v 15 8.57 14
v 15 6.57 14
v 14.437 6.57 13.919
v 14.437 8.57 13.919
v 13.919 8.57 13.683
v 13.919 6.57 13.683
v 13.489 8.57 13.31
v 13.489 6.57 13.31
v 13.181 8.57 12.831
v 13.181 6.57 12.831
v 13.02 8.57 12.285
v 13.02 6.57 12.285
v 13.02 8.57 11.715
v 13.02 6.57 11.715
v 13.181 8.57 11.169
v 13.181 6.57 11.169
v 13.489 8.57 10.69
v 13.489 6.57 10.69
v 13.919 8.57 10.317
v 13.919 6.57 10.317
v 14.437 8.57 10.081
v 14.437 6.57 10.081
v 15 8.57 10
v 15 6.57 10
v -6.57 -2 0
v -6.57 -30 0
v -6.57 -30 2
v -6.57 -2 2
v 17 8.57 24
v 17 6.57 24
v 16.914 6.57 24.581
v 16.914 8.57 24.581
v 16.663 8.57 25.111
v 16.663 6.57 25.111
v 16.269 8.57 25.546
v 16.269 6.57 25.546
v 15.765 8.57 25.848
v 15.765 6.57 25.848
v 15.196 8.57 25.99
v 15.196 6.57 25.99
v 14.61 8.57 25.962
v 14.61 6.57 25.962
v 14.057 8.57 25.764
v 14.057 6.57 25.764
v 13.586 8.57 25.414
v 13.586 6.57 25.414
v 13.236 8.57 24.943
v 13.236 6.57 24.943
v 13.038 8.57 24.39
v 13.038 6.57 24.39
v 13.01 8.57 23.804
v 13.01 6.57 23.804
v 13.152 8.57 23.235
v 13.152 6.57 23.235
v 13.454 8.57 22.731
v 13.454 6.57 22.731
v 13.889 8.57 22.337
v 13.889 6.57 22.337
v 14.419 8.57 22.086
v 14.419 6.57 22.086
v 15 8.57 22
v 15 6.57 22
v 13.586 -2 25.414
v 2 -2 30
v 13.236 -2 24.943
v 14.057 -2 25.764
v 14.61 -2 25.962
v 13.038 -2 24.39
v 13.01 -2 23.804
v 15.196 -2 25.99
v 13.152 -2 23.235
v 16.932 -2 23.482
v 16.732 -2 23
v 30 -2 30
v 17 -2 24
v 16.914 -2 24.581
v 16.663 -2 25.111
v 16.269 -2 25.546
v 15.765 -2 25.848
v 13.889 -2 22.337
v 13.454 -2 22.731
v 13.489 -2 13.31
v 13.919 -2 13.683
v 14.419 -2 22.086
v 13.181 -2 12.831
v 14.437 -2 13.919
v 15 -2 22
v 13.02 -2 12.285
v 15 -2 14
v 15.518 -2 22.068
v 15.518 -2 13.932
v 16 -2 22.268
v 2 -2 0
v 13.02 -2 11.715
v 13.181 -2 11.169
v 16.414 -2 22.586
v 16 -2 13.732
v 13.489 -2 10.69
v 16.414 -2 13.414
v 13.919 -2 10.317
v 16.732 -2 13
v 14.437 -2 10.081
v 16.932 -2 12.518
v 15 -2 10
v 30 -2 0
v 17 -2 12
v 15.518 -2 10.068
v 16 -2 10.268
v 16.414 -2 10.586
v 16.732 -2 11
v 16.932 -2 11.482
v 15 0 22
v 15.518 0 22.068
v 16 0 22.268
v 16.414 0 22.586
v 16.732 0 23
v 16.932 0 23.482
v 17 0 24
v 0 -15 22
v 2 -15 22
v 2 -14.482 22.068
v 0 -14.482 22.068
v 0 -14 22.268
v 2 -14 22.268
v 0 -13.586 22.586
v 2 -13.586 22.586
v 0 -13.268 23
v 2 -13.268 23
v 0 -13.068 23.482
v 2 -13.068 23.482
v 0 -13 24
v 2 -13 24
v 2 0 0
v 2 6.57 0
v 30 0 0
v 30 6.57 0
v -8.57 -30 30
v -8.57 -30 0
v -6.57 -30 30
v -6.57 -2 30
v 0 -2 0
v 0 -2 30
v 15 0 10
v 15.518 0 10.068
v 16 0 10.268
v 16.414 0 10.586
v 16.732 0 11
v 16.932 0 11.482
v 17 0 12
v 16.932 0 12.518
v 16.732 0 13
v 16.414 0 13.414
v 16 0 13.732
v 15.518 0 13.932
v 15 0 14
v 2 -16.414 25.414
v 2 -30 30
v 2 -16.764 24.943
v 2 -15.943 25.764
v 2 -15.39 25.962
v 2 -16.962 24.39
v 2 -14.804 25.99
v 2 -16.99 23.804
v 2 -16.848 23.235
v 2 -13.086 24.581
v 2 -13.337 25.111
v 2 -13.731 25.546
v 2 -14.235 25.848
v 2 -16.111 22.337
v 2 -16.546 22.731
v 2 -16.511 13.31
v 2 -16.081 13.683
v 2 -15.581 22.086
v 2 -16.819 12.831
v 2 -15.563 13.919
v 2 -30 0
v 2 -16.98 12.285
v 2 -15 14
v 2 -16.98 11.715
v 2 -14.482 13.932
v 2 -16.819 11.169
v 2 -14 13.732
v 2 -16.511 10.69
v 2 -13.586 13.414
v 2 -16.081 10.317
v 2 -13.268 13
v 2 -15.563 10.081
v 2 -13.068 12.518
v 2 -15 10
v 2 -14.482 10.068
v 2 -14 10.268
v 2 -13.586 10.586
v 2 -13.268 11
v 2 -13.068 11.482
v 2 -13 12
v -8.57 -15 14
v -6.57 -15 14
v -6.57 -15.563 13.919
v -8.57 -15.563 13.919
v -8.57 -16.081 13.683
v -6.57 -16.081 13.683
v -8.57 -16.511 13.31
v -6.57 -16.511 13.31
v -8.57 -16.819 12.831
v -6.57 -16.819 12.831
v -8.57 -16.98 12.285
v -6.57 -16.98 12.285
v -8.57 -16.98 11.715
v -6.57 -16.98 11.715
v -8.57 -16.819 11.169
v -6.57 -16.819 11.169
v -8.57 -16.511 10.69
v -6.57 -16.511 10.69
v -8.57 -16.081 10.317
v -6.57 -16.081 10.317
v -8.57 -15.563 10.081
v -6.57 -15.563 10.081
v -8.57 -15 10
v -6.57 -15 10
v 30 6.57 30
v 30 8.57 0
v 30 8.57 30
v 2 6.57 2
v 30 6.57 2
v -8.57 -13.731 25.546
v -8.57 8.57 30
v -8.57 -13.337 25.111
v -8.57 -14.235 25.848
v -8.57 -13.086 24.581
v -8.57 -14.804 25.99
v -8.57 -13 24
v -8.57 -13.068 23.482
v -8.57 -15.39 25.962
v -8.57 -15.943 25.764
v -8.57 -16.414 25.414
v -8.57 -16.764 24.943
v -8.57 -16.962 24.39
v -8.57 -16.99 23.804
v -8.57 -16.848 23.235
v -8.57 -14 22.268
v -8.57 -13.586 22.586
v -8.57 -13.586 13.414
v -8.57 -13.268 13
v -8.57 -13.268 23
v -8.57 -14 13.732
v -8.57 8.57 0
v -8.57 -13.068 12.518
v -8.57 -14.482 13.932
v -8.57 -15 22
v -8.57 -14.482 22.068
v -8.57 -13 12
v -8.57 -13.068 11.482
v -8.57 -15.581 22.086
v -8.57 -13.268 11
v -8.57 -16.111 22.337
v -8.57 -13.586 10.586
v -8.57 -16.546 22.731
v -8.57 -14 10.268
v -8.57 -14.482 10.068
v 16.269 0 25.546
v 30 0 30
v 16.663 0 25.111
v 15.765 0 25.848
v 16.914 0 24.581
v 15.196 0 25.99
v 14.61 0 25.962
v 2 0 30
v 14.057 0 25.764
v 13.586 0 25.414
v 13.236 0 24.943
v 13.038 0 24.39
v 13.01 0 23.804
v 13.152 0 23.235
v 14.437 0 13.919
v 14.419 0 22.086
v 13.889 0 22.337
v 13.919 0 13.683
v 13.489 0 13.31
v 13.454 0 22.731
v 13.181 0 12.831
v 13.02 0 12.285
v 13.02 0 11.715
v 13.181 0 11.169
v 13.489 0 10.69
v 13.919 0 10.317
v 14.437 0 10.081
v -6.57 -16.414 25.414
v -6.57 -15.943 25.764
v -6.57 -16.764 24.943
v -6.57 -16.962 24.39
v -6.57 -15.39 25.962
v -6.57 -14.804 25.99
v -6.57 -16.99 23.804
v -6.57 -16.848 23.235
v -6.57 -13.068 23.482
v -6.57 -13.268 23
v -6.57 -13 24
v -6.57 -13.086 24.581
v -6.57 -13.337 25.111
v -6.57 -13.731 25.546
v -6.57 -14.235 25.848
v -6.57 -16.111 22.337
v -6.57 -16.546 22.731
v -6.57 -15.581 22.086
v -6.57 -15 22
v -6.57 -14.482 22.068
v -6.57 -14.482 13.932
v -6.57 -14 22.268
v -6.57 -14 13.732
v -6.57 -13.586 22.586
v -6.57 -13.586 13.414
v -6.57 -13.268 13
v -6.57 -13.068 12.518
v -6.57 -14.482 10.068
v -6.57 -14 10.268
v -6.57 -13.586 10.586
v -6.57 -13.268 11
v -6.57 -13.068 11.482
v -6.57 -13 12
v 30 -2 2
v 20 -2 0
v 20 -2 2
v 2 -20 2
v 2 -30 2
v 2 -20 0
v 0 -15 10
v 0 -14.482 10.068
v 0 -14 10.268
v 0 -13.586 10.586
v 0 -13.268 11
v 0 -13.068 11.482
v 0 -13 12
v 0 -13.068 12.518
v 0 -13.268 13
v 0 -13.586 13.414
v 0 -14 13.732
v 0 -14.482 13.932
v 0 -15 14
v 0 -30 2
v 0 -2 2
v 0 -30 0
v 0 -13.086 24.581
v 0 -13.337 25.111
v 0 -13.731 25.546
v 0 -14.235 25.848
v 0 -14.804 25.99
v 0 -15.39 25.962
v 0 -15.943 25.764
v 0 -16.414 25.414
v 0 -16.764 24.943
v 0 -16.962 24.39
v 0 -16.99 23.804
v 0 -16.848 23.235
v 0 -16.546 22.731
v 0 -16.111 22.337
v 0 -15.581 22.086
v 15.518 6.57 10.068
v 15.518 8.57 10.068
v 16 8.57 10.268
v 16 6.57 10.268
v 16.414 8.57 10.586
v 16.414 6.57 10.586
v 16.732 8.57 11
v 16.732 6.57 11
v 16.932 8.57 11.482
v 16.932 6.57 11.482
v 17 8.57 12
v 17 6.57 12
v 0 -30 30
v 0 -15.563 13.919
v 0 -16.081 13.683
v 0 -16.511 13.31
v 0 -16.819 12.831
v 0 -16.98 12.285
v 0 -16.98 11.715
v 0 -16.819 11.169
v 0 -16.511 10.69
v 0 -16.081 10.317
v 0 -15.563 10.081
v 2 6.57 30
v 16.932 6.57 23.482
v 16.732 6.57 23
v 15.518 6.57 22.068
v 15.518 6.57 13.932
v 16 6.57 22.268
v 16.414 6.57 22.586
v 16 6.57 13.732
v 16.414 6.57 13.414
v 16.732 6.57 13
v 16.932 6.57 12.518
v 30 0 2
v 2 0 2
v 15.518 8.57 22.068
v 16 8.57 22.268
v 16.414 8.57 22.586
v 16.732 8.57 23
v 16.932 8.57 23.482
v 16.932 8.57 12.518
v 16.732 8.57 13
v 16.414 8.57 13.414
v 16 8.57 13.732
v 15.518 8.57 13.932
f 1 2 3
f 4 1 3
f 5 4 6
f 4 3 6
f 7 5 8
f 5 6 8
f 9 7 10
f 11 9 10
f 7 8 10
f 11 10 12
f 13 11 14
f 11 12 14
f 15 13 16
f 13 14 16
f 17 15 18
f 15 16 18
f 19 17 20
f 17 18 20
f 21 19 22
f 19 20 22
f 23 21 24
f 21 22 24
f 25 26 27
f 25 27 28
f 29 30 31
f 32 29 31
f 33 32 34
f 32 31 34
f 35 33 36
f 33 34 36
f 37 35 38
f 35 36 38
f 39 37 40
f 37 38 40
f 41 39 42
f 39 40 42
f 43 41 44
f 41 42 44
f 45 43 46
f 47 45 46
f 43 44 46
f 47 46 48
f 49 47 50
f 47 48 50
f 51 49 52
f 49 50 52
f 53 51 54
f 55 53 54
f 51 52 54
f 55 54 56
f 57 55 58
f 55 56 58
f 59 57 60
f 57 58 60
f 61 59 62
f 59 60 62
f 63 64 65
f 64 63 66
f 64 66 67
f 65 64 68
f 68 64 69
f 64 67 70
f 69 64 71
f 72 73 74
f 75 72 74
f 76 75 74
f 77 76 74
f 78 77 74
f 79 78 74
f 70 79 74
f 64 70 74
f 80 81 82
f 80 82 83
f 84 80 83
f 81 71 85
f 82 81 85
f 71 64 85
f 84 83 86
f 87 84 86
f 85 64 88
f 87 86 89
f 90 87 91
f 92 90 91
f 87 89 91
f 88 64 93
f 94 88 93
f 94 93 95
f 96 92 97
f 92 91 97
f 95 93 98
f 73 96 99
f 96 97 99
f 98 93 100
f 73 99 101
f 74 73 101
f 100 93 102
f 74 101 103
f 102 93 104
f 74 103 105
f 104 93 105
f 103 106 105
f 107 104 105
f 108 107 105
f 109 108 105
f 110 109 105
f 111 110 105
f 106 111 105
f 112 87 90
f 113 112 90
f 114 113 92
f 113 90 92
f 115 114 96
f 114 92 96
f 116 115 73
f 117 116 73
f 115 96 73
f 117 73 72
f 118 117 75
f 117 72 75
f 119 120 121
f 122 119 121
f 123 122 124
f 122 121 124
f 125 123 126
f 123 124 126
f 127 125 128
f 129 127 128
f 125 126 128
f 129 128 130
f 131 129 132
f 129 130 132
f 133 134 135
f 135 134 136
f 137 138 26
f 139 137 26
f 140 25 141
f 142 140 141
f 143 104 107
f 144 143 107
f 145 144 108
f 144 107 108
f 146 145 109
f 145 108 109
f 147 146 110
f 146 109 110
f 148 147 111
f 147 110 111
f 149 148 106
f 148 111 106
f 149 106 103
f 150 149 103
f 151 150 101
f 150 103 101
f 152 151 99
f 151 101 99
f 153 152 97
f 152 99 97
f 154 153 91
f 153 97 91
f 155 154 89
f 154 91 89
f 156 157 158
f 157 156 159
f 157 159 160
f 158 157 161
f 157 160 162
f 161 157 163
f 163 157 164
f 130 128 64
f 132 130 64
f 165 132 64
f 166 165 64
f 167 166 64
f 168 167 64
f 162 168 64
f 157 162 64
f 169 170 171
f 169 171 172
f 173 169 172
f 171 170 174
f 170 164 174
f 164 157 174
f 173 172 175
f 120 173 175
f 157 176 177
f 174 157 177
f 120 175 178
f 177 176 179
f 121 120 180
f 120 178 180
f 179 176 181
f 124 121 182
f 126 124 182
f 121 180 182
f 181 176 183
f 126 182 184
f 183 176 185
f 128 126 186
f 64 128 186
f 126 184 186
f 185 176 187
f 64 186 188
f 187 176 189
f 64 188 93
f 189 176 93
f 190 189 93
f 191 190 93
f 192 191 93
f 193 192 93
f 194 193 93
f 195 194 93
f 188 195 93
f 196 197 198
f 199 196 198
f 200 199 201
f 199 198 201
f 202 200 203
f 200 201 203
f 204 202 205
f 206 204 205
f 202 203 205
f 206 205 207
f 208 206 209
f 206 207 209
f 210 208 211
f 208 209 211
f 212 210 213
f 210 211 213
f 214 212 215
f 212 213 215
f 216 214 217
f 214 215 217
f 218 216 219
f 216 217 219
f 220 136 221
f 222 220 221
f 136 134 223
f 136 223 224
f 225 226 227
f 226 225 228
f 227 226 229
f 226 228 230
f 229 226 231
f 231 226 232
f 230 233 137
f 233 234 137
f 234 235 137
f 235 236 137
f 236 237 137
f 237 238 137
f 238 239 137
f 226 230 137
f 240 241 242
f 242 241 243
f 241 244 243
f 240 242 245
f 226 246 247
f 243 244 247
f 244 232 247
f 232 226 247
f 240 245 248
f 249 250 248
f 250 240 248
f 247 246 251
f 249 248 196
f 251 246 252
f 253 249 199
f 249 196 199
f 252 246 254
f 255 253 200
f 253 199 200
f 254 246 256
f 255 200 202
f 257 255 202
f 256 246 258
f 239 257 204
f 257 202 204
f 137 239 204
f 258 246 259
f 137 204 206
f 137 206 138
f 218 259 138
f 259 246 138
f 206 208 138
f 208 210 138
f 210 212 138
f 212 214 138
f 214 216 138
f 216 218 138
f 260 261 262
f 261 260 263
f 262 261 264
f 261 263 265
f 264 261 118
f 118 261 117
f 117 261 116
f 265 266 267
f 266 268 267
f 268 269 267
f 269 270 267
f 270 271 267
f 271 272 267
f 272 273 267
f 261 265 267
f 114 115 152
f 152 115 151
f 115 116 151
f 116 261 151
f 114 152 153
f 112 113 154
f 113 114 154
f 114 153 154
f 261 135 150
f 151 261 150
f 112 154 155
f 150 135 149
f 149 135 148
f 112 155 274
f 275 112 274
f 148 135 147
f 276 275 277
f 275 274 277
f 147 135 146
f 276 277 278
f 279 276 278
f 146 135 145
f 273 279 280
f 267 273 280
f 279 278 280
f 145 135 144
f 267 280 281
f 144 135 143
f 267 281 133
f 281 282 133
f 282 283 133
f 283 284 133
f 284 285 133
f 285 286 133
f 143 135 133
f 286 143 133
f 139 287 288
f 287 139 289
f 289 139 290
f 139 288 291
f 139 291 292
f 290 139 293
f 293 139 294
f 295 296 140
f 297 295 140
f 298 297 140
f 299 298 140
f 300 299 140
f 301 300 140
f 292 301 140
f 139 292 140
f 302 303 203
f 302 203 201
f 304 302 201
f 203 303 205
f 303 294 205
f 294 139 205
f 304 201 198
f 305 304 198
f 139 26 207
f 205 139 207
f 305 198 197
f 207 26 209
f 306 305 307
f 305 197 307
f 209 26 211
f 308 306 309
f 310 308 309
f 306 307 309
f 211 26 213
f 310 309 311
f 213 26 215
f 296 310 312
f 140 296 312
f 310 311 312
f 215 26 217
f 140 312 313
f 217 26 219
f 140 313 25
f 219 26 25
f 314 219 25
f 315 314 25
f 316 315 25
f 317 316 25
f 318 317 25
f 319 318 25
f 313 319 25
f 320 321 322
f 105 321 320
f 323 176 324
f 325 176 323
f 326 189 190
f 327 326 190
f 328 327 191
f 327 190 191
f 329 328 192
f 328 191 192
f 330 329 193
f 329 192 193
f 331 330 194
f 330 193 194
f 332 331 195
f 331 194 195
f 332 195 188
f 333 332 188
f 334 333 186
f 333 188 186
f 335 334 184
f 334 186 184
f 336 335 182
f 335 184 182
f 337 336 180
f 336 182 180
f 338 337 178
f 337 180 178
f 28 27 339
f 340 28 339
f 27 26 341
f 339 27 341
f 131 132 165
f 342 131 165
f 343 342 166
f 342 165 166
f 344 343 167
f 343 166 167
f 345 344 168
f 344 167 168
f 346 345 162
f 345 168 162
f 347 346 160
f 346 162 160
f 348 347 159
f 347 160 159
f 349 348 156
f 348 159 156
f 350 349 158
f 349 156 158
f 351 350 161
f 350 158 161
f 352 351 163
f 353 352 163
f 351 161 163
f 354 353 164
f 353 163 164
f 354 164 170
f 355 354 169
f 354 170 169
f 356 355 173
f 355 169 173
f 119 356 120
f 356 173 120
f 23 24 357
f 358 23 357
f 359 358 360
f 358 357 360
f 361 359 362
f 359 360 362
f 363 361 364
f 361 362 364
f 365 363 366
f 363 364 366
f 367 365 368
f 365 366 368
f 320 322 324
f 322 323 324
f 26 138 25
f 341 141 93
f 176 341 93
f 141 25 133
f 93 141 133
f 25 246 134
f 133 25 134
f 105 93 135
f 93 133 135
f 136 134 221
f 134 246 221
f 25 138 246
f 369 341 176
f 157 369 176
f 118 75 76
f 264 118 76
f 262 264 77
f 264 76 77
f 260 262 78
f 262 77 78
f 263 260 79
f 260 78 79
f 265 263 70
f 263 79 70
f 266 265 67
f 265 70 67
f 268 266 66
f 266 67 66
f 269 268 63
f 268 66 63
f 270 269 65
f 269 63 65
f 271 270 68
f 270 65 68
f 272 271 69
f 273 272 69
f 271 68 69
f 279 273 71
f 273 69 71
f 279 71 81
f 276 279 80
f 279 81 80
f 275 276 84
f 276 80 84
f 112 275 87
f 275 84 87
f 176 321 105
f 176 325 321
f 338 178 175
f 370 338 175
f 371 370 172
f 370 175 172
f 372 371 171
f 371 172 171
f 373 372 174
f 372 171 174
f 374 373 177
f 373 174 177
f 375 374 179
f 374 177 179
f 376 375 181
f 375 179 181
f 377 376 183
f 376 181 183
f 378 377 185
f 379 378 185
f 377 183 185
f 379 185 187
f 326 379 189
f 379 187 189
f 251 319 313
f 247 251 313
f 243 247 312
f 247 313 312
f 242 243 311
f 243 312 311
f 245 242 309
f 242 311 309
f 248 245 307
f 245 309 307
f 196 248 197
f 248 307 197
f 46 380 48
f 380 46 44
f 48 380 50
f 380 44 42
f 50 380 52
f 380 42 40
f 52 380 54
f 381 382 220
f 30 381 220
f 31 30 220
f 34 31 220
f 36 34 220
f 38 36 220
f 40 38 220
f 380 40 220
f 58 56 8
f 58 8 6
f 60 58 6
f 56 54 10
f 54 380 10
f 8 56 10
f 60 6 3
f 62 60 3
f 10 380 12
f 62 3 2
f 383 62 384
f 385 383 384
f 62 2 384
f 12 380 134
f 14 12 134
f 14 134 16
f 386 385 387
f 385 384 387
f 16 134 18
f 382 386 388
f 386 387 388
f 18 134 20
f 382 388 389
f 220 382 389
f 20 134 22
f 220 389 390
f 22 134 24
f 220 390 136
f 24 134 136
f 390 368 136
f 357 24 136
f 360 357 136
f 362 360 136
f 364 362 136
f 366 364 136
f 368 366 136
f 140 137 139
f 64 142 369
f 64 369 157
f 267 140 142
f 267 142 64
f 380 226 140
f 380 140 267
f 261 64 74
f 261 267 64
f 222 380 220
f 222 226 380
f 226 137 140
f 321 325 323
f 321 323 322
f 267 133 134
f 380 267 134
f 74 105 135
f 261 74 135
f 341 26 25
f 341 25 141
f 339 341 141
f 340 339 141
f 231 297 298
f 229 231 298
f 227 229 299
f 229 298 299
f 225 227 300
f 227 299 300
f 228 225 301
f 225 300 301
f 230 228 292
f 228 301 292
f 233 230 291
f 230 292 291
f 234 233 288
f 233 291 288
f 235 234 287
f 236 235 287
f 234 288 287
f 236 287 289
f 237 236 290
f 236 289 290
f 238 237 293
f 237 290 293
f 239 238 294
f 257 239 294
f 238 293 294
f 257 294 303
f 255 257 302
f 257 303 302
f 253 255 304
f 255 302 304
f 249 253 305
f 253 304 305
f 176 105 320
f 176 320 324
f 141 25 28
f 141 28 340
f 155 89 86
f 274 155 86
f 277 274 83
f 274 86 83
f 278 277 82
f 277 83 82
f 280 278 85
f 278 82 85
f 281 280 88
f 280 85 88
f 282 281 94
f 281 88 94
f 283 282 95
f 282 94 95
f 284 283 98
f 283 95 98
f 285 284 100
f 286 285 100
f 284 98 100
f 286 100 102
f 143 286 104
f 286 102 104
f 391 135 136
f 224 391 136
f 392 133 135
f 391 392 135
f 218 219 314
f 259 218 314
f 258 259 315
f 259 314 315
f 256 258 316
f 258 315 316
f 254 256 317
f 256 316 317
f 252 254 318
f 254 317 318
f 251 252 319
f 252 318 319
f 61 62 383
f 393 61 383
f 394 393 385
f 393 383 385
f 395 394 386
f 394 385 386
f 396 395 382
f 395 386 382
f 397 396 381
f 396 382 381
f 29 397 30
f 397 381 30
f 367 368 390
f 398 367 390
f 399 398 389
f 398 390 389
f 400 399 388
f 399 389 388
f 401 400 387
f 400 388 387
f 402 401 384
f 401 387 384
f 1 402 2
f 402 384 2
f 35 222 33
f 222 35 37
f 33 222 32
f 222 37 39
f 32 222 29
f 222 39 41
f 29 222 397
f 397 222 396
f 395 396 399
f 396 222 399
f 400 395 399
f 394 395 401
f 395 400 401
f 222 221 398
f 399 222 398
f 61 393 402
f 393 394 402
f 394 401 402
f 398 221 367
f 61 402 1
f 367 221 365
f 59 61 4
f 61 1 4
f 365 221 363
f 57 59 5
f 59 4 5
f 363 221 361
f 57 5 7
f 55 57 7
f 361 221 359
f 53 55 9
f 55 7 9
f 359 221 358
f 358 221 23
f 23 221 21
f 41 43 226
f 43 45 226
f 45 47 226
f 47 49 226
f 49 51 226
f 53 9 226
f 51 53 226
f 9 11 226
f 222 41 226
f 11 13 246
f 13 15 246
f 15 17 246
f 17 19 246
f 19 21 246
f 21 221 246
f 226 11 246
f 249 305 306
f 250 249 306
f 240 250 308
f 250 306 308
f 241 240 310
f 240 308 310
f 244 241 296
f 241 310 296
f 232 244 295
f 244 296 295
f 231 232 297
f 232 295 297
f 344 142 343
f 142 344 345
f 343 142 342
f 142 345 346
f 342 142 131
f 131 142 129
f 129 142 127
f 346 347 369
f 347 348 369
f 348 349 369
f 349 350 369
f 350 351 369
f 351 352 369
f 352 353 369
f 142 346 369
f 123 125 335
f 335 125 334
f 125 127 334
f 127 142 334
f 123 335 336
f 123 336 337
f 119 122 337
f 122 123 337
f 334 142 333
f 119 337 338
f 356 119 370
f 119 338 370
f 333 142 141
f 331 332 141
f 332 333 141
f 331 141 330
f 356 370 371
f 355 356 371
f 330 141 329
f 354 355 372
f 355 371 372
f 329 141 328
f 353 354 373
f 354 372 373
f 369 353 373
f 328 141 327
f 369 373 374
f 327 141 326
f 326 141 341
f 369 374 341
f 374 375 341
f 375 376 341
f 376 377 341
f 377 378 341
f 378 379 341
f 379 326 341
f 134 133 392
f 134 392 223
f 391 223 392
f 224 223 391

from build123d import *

# Parameters (mm, degrees)
F0_W     = 2
F0_H     = 2
F0_W_2   = 28
F0_H_2   = 28
F1_DEPTH = 30
F0_H_3   = 6.57
F2_DEPTH = 2
F0_W_3   = 6.57
F4_DEPTH = 2
F6_DEPTH = 20
F8_DEPTH = 25


# Not quite as in the source:
# - a feature names something its author has since deleted; it is built from what else it names


with BuildPart() as f1:
    # F0 (on Top) → F1 (new body)
    with BuildSketch(Plane.XY):
        Polygon((-6.57, -2), (-6.57, 6.57), (-8.57, 6.57), (-8.57, -30), (-6.57, -30), align=None)
        with Locations((-7.57, 7.57)):
            Rectangle(F0_W, F0_H)
        Polygon((2, 6.57), (30, 6.57), (30, 8.57), (-6.57, 8.57), (-6.57, 6.57), align=None)
        with Locations((16, -1)):
            Rectangle(F0_W_2, F0_H)
        with Locations((1, -16)):
            Rectangle(F0_W, F0_H_2)
        with Locations((1, -1)):
            Rectangle(F0_W, F0_H)
        Polygon((0, 0), (2, 0), (2, 6.57), (-6.57, 6.57), (-6.57, -2), (0, -2), align=None)
    extrude(amount=F1_DEPTH)


with BuildPart() as f2:
    # F0 (on Top) → F2 (new body)
    with BuildSketch(Plane.XY):
        with Locations((16, 3.285)):
            Rectangle(F0_W_2, F0_H_3)
    extrude(amount=F2_DEPTH)


with BuildPart() as f2b:
    # F0 (on Top) → F2, piece 2 (new body)
    with BuildSketch(Plane.XY):
        with Locations((-3.285, -16)):
            Rectangle(F0_W_3, F0_H_2)
    extrude(amount=F2_DEPTH)


with BuildPart() as f4:
    # F3 (on face) → F4 (new body)
    with BuildSketch(Plane(origin=(0, 0, 0), x_dir=(1, 0, 0), z_dir=(0, 0, -1))):
        Polygon((20, 2), (30, 2), (2, 30), (2, 20), align=None)
    extrude(amount=-F4_DEPTH)


with BuildPart() as f6:
    # F5 (on face) → F6 (new body)
    with BuildSketch(Plane.YZ.offset(2)):
        with BuildLine():
            ThreePointArc((-13, 24), (-16.4142135624, 25.4142135624), (-15, 22))
            ThreePointArc((-15, 22), (-13.5857864376, 22.5857864376), (-13, 24))
        make_face()
    extrude(amount=-F6_DEPTH)


with BuildPart() as f6b:
    # F5 (on face) → F6, piece 2 (new body)
    with BuildSketch(Plane.YZ.offset(2)):
        with BuildLine():
            Line((-15, 12), (-15, 10))
            ThreePointArc((-15, 10), (-13.5857864376, 10.5857864376), (-13, 12))
            ThreePointArc((-13, 12), (-13.5857864376, 13.4142135624), (-15, 14))
            Line((-15, 14), (-15, 12))
        make_face()
        with BuildLine():
            ThreePointArc((-15, 14), (-17, 12), (-15, 10))
            Line((-15, 10), (-15, 12))
            Line((-15, 12), (-15, 14))
        make_face()
    extrude(amount=-F6_DEPTH)


with BuildPart() as f8:
    # F7 (on face) → F8 (new body)
    with BuildSketch(Plane.XZ.offset(2)):
        with BuildLine():
            ThreePointArc((17, 24), (13.5857864376, 25.4142135624), (15, 22))
            ThreePointArc((15, 22), (16.4142135624, 22.5857864376), (17, 24))
        make_face()
    extrude(amount=-F8_DEPTH)


with BuildPart() as f8b:
    # F7 (on face) → F8, piece 2 (new body)
    with BuildSketch(Plane.XZ.offset(2)):
        with BuildLine():
            ThreePointArc((15, 14), (13, 12), (15, 10))
            Line((15, 10), (15, 12))
            Line((15, 12), (15, 14))
        make_face()
        with BuildLine():
            Line((15, 12), (15, 10))
            ThreePointArc((15, 10), (16.4142135624, 10.5857864376), (17, 12))
            ThreePointArc((17, 12), (16.4142135624, 13.4142135624), (15, 14))
            Line((15, 14), (15, 12))
        make_face()
    extrude(amount=-F8_DEPTH)


with BuildPart() as f1_1:
    add(f1.part)

    # F9: cut F8, F6, F6b, F8b
    add(f8.part, mode=Mode.SUBTRACT)
    add(f6.part, mode=Mode.SUBTRACT)
    add(f6b.part, mode=Mode.SUBTRACT)
    add(f8b.part, mode=Mode.SUBTRACT)


solid = Compound([f2.part, f2b.part, f4.part, f1_1.part])
